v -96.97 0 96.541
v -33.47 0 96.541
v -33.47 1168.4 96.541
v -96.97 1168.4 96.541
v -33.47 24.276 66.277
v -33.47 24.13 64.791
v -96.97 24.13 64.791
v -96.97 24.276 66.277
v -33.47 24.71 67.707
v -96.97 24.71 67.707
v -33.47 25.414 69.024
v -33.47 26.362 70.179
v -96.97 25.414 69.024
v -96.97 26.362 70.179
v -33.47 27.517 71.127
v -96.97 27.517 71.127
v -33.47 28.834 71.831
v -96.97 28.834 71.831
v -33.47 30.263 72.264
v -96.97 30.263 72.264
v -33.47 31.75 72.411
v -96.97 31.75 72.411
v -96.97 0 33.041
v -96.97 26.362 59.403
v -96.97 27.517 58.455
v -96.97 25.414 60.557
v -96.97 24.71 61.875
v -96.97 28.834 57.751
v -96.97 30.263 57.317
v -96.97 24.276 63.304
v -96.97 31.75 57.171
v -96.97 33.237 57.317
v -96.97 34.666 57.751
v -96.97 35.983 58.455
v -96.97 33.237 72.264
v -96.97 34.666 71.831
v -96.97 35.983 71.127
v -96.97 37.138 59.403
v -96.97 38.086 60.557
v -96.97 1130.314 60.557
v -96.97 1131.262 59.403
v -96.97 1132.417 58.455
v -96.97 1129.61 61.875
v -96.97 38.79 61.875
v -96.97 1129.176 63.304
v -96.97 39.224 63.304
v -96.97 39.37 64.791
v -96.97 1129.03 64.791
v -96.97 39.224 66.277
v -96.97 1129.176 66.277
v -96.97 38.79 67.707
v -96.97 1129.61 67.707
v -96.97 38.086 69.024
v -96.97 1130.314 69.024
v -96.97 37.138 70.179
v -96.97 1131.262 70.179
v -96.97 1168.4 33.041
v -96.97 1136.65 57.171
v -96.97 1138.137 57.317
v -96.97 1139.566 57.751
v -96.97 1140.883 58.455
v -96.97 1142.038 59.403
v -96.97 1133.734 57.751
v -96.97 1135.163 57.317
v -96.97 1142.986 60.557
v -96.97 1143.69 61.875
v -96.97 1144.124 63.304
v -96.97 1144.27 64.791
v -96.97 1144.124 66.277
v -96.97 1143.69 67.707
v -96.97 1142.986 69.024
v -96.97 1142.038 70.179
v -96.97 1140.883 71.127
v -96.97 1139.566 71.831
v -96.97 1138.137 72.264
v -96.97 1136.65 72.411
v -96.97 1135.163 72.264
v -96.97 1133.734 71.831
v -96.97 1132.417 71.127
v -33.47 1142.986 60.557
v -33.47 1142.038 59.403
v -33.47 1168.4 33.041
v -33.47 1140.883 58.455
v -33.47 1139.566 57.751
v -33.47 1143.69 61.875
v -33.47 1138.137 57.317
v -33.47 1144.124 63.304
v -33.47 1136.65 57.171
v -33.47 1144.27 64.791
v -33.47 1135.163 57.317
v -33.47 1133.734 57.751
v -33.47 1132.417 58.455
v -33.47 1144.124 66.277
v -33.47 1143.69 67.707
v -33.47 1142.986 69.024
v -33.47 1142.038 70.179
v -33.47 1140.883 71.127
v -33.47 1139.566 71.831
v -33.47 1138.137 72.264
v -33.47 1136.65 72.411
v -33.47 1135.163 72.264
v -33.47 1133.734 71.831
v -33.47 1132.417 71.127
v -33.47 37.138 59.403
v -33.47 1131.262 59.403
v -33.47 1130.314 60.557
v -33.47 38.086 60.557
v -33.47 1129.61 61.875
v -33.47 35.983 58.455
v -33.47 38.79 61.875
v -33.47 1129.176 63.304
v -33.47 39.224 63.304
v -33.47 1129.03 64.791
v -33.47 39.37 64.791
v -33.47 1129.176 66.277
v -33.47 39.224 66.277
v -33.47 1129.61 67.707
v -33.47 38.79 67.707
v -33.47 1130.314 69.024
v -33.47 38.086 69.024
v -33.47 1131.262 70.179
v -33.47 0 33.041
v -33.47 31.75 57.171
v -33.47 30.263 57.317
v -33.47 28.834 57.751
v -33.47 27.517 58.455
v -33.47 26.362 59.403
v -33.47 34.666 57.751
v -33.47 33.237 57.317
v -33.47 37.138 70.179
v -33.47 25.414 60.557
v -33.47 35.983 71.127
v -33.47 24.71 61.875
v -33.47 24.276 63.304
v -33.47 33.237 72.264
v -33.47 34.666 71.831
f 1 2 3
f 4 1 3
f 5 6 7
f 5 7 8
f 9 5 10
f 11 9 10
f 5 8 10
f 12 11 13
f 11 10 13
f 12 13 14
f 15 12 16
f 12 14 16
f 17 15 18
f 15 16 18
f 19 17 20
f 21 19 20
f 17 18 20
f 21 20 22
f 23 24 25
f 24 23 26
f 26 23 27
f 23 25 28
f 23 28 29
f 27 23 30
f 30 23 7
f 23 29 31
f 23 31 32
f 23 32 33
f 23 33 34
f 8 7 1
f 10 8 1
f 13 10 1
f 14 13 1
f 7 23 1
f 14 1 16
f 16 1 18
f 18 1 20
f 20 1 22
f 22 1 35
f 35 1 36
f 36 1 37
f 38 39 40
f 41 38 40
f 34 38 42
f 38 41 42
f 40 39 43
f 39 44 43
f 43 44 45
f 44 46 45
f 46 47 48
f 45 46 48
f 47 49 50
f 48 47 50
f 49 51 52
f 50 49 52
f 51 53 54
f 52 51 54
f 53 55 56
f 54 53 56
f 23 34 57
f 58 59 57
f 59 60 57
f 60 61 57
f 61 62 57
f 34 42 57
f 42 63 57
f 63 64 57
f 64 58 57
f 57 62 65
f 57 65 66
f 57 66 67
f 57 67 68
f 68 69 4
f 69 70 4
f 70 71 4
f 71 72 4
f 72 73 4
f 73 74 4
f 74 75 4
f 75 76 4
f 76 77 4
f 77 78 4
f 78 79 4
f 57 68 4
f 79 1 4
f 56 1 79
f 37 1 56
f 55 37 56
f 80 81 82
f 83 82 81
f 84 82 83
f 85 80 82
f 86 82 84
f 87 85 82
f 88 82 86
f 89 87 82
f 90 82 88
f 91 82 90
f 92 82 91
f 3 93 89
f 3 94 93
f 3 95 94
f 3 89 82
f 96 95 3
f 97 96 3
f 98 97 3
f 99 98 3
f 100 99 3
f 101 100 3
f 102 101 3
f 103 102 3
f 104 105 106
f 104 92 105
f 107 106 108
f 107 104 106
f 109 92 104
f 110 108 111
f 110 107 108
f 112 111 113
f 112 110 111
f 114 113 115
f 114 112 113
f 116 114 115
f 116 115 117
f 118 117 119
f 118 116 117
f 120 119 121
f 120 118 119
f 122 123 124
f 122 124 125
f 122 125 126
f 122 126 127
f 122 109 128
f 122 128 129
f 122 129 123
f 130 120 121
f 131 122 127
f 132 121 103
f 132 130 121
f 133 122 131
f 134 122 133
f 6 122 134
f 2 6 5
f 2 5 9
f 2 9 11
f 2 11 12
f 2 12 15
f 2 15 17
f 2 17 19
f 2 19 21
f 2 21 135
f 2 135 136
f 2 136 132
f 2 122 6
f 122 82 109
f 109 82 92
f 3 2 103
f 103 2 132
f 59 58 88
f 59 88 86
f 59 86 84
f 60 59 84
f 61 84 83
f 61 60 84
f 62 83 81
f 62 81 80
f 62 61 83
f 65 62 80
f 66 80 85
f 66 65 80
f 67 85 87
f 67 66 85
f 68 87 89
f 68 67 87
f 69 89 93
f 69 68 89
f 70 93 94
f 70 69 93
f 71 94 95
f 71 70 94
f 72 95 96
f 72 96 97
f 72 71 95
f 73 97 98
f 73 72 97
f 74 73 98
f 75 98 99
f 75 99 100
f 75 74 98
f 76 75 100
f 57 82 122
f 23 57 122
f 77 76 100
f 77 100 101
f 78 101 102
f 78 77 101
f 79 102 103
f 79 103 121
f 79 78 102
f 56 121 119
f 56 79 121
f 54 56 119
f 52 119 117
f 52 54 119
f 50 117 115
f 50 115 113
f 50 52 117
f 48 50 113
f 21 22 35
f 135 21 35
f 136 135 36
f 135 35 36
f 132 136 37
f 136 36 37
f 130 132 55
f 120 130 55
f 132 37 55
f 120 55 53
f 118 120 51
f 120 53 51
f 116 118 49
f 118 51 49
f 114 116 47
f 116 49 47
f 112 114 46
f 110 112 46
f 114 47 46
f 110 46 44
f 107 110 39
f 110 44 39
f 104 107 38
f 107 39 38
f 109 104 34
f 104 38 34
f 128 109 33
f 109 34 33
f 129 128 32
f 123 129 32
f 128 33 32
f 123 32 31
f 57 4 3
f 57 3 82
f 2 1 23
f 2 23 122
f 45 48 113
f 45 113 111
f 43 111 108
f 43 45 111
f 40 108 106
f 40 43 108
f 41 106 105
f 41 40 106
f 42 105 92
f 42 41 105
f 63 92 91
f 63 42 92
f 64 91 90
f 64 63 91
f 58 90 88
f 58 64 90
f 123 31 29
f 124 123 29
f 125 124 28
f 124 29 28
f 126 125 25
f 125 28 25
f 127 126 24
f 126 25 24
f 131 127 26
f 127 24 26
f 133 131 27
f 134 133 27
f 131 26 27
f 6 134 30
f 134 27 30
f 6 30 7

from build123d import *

# Parameters (mm, degrees)
F0_W     = 63.5
F0_H     = 63.5
F1_DEPTH = 1168.4
F3_DEPTH = 25.4
F4_DEPTH = 63.5
F5_W     = 25.4
F5_H     = 63.5
F6_DEPTH = 63.5
F8_DEPTH = 76.2


with BuildPart() as f1:
    # F0 (on Front) → F1 (new body)
    with BuildSketch(Plane.XZ):
        with Locations((-65.2197142243, 64.7908774316)):
            Rectangle(F0_W, F0_H)
    extrude(amount=-F1_DEPTH)

    # F2 (on face) → F3 (join)
    with BuildSketch(Plane(origin=(-96.9697142243, 0, 0), x_dir=(0, -1, 0), z_dir=(-1, 0, 0))):
        with BuildLine():
            Line((-1168.4, 96.5408774316), (-1168.4, 33.0408774316))
            Line((-1168.4, 33.0408774316), (-1136.65, 33.0408774316))
            Line((-1136.65, 33.0408774316), (-1136.65, 57.1708774316))
            ThreePointArc((-1136.65, 57.1708774316), (-1144.27, 64.7908774316), (-1136.65, 72.4108774316))
            Line((-1136.65, 72.4108774316), (-1136.65, 96.5408774316))
            Line((-1136.65, 96.5408774316), (-1168.4, 96.5408774316))
        make_face()
        with BuildLine():
            Line((-1136.65, 57.1708774316), (-1136.65, 33.0408774316))
            Line((-1136.65, 33.0408774316), (-1104.9, 33.0408774316))
            Line((-1104.9, 33.0408774316), (-1104.9, 96.5408774316))
            Line((-1104.9, 96.5408774316), (-1136.65, 96.5408774316))
            Line((-1136.65, 96.5408774316), (-1136.65, 72.4108774316))
            ThreePointArc((-1136.65, 72.4108774316), (-1131.2618463274, 70.1790311043), (-1129.03, 64.7908774316))
            ThreePointArc((-1129.03, 64.7908774316), (-1131.2618463274, 59.402723759), (-1136.65, 57.1708774316))
        make_face()
    extrude(amount=F3_DEPTH)

    # F4 (cut): a face of the model
    f4_faces = [f1.faces().sort_by_distance(p)[0] for p in [
        (-96.9697142243, 1136.65, 64.7908774316),
    ]]
    extrude(f4_faces, amount=-F4_DEPTH, mode=Mode.SUBTRACT)

    # F5 (on face) → F6 (cut)
    with BuildSketch(Plane.XY.offset(96.5408774316)):
        with Locations((-109.6697142243, 1136.65)):
            Rectangle(F5_W, F5_H)
    extrude(amount=-F6_DEPTH, mode=Mode.SUBTRACT)

    # F7 (on face) → F8 (cut)
    with BuildSketch(Plane(origin=(-96.9697142243, 0, 0), x_dir=(0, -1, 0), z_dir=(-1, 0, 0))):
        with BuildLine():
            ThreePointArc((-24.13, 64.7908774316), (-26.3618463274, 70.1790311043), (-31.75, 72.4108774316))
            Line((-31.75, 72.4108774316), (-31.75, 57.1708774316))
            ThreePointArc((-31.75, 57.1708774316), (-26.3618463274, 59.402723759), (-24.13, 64.7908774316))
        make_face()
        with BuildLine():
            Line((-31.75, 57.1708774316), (-31.75, 72.4108774316))
            ThreePointArc((-31.75, 72.4108774316), (-39.37, 64.7908774316), (-31.75, 57.1708774316))
        make_face()
    extrude(amount=-F8_DEPTH, mode=Mode.SUBTRACT)


solid = f1.part
